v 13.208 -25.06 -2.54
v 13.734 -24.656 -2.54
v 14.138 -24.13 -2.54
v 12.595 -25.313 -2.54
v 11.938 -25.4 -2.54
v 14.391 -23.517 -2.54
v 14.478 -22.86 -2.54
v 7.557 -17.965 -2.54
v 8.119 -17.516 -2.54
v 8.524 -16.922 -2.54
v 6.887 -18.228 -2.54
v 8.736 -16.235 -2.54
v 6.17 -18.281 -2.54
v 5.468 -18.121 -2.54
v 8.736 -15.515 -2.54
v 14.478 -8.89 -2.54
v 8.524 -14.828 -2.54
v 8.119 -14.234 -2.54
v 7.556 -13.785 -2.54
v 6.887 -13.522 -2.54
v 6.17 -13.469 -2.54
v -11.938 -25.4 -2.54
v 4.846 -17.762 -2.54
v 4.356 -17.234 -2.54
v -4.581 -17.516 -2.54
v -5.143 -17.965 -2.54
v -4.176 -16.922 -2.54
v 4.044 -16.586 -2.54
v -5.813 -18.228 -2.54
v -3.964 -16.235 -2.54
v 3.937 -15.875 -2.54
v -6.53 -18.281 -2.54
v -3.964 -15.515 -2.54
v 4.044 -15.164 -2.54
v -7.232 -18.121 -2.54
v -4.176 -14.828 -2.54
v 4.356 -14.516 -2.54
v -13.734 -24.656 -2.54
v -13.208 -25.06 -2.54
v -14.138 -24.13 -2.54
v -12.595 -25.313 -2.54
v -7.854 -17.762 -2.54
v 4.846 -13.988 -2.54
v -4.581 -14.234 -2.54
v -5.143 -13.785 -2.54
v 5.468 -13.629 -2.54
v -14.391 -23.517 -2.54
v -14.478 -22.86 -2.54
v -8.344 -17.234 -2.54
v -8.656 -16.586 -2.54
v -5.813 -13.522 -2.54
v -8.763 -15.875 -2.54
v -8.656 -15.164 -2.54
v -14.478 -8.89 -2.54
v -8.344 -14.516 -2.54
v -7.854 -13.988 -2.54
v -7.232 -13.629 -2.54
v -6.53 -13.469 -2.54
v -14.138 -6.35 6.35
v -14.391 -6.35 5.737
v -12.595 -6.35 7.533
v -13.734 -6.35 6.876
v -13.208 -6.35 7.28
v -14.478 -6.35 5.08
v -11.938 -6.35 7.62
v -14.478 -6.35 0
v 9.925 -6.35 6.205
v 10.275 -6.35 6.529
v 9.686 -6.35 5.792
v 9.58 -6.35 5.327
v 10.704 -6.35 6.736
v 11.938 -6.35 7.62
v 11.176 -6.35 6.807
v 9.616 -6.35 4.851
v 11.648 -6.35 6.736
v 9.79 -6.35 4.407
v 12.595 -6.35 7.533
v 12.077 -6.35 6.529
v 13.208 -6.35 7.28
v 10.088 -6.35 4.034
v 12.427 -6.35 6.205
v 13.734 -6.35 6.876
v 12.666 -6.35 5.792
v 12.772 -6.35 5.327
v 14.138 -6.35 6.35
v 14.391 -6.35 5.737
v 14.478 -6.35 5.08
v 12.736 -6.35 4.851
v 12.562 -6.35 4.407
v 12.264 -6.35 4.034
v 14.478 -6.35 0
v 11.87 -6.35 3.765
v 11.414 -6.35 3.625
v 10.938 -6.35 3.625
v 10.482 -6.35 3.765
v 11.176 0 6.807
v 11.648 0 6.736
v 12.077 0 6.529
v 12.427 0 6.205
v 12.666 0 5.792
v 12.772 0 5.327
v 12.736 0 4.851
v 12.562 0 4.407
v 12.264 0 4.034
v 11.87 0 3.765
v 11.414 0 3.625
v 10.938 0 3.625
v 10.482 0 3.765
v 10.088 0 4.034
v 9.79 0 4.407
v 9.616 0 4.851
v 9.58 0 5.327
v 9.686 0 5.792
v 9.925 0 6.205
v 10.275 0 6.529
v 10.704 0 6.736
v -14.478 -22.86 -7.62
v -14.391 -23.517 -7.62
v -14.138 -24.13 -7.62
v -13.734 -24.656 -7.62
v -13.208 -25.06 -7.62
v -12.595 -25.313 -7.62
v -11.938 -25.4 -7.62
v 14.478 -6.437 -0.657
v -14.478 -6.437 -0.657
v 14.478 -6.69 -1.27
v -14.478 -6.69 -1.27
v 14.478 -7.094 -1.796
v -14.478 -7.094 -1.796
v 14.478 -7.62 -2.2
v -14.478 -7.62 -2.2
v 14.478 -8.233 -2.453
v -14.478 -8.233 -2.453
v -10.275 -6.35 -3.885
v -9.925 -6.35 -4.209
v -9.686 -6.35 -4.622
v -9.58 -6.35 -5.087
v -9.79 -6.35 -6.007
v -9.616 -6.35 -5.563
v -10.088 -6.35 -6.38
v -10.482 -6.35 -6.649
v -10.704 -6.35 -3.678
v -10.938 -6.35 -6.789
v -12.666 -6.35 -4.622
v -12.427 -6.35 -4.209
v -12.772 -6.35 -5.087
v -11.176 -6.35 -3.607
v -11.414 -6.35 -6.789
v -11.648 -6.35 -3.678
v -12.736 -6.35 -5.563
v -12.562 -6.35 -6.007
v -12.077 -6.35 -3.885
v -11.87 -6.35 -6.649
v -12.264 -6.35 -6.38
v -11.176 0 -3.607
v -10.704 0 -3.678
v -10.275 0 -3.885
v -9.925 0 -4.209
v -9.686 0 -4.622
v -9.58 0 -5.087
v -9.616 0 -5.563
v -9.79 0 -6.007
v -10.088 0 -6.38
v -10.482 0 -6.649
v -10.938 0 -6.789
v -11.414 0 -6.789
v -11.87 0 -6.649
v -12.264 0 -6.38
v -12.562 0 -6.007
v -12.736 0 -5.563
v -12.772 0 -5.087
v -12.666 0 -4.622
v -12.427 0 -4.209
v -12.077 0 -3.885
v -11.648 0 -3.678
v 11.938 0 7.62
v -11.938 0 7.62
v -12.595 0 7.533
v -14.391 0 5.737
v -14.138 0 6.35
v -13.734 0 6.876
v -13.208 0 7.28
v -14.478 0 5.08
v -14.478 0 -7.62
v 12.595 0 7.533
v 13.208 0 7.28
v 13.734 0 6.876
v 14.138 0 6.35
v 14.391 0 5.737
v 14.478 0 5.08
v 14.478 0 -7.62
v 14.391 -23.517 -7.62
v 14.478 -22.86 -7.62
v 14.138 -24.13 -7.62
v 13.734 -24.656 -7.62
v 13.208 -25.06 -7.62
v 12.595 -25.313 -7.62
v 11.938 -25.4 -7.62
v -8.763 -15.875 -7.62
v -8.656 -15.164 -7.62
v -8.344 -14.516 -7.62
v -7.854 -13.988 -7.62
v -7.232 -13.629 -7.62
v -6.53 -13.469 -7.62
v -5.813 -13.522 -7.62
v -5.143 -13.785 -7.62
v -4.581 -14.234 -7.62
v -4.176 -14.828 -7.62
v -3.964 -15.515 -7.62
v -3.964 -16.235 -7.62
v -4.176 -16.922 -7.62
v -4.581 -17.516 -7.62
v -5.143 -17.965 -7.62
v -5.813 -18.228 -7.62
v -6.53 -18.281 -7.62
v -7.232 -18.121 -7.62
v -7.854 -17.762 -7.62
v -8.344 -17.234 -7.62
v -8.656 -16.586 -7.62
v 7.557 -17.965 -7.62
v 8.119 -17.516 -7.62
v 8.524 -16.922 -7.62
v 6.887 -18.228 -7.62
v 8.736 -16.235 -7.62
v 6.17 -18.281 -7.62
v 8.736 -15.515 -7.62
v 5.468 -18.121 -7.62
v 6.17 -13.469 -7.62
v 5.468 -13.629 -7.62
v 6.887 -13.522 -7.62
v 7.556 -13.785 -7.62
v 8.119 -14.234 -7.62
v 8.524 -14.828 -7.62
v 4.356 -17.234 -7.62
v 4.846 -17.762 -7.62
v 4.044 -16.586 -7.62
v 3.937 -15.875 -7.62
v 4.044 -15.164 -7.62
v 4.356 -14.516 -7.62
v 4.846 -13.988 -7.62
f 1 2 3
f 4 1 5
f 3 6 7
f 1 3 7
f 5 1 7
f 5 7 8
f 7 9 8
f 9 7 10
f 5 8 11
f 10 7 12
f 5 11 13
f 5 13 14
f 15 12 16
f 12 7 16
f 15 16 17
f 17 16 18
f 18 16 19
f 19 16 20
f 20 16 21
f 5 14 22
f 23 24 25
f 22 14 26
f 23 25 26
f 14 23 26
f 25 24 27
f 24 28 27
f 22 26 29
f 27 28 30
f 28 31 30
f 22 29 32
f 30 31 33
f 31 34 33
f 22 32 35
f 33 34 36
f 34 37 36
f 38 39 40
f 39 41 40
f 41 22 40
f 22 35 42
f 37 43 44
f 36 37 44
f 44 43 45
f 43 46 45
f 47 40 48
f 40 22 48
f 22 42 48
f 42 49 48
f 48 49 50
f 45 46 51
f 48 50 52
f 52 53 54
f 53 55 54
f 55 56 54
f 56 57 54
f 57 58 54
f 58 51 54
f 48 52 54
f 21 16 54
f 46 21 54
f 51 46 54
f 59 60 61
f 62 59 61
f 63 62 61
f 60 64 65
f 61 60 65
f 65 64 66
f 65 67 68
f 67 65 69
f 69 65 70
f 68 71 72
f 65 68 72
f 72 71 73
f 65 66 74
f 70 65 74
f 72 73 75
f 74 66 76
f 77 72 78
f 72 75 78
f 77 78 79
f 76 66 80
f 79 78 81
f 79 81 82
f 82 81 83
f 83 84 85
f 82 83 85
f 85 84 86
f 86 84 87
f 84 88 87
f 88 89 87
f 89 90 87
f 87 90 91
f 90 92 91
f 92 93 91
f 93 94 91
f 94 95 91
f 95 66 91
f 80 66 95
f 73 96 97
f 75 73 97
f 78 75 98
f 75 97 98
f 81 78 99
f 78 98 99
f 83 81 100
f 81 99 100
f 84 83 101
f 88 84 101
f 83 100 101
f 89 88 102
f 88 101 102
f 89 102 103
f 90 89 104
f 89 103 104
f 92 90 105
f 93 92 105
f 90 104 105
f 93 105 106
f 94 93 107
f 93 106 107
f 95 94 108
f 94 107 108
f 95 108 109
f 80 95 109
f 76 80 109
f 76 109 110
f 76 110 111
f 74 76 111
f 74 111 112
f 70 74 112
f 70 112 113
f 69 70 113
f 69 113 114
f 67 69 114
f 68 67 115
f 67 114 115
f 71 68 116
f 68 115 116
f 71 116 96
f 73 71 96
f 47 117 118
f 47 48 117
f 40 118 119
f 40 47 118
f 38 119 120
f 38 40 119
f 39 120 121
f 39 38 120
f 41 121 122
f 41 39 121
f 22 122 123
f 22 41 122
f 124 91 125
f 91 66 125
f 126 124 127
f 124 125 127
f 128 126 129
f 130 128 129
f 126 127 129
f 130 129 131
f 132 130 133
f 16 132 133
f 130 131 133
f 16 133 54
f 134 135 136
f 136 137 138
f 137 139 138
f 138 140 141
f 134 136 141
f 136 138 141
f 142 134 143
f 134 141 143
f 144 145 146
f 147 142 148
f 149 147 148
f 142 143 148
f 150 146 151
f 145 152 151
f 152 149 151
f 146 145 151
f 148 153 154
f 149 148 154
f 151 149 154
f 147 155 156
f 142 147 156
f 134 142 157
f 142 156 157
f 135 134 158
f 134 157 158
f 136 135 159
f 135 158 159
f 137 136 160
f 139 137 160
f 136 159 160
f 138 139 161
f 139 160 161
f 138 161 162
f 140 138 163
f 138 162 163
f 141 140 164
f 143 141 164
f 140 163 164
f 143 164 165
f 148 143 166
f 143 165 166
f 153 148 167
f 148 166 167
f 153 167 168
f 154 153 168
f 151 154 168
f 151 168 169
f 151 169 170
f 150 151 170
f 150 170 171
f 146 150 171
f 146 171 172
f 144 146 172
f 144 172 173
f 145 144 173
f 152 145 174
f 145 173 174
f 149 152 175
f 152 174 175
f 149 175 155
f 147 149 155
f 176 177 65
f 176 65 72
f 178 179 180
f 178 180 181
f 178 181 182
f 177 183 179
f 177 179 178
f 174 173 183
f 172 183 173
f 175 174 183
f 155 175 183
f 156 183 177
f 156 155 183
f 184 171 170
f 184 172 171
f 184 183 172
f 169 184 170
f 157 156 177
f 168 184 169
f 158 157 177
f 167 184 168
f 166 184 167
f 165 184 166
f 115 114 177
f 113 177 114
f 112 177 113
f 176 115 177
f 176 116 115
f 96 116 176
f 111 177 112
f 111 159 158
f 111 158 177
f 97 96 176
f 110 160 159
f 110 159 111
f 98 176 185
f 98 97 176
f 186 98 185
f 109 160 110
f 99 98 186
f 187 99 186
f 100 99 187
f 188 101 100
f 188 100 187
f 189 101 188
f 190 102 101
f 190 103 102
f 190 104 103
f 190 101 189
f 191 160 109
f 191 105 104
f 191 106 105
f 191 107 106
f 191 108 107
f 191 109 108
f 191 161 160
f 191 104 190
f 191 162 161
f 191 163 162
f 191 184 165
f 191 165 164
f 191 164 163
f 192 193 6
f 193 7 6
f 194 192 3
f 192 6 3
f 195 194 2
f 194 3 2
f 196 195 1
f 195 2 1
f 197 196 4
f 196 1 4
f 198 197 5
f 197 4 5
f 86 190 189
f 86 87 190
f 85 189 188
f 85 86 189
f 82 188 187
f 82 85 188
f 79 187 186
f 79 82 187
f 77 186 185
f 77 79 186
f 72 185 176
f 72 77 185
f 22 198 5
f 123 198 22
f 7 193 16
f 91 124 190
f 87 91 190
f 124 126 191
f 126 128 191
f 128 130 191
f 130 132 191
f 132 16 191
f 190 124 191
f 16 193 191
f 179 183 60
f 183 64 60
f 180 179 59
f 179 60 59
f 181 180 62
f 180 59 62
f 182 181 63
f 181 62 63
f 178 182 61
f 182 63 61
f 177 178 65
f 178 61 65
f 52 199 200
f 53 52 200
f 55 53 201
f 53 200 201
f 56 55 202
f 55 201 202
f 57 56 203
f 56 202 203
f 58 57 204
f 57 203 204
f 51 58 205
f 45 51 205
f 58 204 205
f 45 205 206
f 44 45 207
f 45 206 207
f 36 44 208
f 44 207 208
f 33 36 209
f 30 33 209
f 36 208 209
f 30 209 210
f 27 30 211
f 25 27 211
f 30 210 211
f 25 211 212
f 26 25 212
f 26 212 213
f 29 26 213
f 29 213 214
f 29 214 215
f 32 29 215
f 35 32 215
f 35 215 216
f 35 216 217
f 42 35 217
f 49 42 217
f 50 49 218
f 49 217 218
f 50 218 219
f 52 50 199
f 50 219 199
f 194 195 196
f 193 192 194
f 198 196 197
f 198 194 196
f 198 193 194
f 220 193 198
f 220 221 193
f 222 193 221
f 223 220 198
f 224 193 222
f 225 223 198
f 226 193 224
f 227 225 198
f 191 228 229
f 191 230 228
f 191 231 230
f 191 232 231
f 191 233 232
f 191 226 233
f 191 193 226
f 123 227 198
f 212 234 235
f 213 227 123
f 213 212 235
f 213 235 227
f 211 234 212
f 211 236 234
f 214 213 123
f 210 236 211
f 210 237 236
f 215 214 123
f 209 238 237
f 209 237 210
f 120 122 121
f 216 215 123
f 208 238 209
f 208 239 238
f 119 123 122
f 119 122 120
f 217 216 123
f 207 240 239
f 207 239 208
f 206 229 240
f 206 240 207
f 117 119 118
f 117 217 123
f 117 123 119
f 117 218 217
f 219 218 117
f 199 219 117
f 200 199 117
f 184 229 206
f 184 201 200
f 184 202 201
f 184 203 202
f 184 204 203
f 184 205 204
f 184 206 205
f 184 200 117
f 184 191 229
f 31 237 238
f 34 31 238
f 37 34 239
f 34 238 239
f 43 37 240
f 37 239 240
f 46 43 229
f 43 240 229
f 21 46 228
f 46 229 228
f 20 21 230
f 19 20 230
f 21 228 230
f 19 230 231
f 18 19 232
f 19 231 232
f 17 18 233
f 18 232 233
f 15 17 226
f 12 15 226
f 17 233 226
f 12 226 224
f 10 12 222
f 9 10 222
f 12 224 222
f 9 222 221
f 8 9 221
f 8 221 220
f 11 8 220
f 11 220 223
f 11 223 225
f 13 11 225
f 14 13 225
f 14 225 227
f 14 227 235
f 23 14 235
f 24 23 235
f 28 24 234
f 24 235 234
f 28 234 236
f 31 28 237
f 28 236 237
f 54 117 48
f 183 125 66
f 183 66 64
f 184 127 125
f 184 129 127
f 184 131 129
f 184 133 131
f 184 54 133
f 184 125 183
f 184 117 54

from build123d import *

# Parameters (mm, degrees)
SKETCH1_W           = 28.956
SKETCH1_H           = 15.24
SKETCH1_R           = 1.6002
BOSS_EXTRUDE1_DEPTH = 6.35
SKETCH2_W           = 28.956
SKETCH2_H           = 19.05
SKETCH2_R           = 2.413
BOSS_EXTRUDE2_DEPTH = 5.08
FILLET1_R           = 2.54


with BuildPart() as part:
    # Sketch1 → Boss-Extrude1 (new body)
    with BuildSketch(Plane(origin=(0, 0, 0), x_dir=(1, 0, 0), z_dir=(0, 1, 0))):
        Rectangle(SKETCH1_W, SKETCH1_H)
        with Locations(Location((-11.176, 5.207, 0), (0, 0, 270))):
            Circle(SKETCH1_R, mode=Mode.SUBTRACT)
        with Locations(Location((11.176, -5.207, 0), (0, 0, 270))):
            Circle(SKETCH1_R, mode=Mode.SUBTRACT)
    extrude(amount=-BOSS_EXTRUDE1_DEPTH)

    # Sketch2 → Boss-Extrude2 (add)
    with BuildSketch(Plane(origin=(0, 0, -7.62), x_dir=(-1, 0, 0), z_dir=(0, 0, -1))):
        with Locations((0, -15.875)):
            Rectangle(SKETCH2_W, SKETCH2_H)
        with Locations((-6.35, -15.875)):
            Circle(SKETCH2_R, mode=Mode.SUBTRACT)
        with Locations((6.35, -15.875)):
            Circle(SKETCH2_R, mode=Mode.SUBTRACT)
    extrude(amount=-BOSS_EXTRUDE2_DEPTH)

    # Fillet1
    fillet1_edges = [part.edges().sort_by_distance(p)[0] for p in [
        (0, -6.35, -2.54),
        (14.478, -25.4, -5.08),
        (-14.478, -25.4, -5.08),
        (14.478, -3.175, 7.62),
        (-14.478, -3.175, 7.62),
    ]]
    fillet(fillet1_edges, radius=FILLET1_R)


solid = part.part
